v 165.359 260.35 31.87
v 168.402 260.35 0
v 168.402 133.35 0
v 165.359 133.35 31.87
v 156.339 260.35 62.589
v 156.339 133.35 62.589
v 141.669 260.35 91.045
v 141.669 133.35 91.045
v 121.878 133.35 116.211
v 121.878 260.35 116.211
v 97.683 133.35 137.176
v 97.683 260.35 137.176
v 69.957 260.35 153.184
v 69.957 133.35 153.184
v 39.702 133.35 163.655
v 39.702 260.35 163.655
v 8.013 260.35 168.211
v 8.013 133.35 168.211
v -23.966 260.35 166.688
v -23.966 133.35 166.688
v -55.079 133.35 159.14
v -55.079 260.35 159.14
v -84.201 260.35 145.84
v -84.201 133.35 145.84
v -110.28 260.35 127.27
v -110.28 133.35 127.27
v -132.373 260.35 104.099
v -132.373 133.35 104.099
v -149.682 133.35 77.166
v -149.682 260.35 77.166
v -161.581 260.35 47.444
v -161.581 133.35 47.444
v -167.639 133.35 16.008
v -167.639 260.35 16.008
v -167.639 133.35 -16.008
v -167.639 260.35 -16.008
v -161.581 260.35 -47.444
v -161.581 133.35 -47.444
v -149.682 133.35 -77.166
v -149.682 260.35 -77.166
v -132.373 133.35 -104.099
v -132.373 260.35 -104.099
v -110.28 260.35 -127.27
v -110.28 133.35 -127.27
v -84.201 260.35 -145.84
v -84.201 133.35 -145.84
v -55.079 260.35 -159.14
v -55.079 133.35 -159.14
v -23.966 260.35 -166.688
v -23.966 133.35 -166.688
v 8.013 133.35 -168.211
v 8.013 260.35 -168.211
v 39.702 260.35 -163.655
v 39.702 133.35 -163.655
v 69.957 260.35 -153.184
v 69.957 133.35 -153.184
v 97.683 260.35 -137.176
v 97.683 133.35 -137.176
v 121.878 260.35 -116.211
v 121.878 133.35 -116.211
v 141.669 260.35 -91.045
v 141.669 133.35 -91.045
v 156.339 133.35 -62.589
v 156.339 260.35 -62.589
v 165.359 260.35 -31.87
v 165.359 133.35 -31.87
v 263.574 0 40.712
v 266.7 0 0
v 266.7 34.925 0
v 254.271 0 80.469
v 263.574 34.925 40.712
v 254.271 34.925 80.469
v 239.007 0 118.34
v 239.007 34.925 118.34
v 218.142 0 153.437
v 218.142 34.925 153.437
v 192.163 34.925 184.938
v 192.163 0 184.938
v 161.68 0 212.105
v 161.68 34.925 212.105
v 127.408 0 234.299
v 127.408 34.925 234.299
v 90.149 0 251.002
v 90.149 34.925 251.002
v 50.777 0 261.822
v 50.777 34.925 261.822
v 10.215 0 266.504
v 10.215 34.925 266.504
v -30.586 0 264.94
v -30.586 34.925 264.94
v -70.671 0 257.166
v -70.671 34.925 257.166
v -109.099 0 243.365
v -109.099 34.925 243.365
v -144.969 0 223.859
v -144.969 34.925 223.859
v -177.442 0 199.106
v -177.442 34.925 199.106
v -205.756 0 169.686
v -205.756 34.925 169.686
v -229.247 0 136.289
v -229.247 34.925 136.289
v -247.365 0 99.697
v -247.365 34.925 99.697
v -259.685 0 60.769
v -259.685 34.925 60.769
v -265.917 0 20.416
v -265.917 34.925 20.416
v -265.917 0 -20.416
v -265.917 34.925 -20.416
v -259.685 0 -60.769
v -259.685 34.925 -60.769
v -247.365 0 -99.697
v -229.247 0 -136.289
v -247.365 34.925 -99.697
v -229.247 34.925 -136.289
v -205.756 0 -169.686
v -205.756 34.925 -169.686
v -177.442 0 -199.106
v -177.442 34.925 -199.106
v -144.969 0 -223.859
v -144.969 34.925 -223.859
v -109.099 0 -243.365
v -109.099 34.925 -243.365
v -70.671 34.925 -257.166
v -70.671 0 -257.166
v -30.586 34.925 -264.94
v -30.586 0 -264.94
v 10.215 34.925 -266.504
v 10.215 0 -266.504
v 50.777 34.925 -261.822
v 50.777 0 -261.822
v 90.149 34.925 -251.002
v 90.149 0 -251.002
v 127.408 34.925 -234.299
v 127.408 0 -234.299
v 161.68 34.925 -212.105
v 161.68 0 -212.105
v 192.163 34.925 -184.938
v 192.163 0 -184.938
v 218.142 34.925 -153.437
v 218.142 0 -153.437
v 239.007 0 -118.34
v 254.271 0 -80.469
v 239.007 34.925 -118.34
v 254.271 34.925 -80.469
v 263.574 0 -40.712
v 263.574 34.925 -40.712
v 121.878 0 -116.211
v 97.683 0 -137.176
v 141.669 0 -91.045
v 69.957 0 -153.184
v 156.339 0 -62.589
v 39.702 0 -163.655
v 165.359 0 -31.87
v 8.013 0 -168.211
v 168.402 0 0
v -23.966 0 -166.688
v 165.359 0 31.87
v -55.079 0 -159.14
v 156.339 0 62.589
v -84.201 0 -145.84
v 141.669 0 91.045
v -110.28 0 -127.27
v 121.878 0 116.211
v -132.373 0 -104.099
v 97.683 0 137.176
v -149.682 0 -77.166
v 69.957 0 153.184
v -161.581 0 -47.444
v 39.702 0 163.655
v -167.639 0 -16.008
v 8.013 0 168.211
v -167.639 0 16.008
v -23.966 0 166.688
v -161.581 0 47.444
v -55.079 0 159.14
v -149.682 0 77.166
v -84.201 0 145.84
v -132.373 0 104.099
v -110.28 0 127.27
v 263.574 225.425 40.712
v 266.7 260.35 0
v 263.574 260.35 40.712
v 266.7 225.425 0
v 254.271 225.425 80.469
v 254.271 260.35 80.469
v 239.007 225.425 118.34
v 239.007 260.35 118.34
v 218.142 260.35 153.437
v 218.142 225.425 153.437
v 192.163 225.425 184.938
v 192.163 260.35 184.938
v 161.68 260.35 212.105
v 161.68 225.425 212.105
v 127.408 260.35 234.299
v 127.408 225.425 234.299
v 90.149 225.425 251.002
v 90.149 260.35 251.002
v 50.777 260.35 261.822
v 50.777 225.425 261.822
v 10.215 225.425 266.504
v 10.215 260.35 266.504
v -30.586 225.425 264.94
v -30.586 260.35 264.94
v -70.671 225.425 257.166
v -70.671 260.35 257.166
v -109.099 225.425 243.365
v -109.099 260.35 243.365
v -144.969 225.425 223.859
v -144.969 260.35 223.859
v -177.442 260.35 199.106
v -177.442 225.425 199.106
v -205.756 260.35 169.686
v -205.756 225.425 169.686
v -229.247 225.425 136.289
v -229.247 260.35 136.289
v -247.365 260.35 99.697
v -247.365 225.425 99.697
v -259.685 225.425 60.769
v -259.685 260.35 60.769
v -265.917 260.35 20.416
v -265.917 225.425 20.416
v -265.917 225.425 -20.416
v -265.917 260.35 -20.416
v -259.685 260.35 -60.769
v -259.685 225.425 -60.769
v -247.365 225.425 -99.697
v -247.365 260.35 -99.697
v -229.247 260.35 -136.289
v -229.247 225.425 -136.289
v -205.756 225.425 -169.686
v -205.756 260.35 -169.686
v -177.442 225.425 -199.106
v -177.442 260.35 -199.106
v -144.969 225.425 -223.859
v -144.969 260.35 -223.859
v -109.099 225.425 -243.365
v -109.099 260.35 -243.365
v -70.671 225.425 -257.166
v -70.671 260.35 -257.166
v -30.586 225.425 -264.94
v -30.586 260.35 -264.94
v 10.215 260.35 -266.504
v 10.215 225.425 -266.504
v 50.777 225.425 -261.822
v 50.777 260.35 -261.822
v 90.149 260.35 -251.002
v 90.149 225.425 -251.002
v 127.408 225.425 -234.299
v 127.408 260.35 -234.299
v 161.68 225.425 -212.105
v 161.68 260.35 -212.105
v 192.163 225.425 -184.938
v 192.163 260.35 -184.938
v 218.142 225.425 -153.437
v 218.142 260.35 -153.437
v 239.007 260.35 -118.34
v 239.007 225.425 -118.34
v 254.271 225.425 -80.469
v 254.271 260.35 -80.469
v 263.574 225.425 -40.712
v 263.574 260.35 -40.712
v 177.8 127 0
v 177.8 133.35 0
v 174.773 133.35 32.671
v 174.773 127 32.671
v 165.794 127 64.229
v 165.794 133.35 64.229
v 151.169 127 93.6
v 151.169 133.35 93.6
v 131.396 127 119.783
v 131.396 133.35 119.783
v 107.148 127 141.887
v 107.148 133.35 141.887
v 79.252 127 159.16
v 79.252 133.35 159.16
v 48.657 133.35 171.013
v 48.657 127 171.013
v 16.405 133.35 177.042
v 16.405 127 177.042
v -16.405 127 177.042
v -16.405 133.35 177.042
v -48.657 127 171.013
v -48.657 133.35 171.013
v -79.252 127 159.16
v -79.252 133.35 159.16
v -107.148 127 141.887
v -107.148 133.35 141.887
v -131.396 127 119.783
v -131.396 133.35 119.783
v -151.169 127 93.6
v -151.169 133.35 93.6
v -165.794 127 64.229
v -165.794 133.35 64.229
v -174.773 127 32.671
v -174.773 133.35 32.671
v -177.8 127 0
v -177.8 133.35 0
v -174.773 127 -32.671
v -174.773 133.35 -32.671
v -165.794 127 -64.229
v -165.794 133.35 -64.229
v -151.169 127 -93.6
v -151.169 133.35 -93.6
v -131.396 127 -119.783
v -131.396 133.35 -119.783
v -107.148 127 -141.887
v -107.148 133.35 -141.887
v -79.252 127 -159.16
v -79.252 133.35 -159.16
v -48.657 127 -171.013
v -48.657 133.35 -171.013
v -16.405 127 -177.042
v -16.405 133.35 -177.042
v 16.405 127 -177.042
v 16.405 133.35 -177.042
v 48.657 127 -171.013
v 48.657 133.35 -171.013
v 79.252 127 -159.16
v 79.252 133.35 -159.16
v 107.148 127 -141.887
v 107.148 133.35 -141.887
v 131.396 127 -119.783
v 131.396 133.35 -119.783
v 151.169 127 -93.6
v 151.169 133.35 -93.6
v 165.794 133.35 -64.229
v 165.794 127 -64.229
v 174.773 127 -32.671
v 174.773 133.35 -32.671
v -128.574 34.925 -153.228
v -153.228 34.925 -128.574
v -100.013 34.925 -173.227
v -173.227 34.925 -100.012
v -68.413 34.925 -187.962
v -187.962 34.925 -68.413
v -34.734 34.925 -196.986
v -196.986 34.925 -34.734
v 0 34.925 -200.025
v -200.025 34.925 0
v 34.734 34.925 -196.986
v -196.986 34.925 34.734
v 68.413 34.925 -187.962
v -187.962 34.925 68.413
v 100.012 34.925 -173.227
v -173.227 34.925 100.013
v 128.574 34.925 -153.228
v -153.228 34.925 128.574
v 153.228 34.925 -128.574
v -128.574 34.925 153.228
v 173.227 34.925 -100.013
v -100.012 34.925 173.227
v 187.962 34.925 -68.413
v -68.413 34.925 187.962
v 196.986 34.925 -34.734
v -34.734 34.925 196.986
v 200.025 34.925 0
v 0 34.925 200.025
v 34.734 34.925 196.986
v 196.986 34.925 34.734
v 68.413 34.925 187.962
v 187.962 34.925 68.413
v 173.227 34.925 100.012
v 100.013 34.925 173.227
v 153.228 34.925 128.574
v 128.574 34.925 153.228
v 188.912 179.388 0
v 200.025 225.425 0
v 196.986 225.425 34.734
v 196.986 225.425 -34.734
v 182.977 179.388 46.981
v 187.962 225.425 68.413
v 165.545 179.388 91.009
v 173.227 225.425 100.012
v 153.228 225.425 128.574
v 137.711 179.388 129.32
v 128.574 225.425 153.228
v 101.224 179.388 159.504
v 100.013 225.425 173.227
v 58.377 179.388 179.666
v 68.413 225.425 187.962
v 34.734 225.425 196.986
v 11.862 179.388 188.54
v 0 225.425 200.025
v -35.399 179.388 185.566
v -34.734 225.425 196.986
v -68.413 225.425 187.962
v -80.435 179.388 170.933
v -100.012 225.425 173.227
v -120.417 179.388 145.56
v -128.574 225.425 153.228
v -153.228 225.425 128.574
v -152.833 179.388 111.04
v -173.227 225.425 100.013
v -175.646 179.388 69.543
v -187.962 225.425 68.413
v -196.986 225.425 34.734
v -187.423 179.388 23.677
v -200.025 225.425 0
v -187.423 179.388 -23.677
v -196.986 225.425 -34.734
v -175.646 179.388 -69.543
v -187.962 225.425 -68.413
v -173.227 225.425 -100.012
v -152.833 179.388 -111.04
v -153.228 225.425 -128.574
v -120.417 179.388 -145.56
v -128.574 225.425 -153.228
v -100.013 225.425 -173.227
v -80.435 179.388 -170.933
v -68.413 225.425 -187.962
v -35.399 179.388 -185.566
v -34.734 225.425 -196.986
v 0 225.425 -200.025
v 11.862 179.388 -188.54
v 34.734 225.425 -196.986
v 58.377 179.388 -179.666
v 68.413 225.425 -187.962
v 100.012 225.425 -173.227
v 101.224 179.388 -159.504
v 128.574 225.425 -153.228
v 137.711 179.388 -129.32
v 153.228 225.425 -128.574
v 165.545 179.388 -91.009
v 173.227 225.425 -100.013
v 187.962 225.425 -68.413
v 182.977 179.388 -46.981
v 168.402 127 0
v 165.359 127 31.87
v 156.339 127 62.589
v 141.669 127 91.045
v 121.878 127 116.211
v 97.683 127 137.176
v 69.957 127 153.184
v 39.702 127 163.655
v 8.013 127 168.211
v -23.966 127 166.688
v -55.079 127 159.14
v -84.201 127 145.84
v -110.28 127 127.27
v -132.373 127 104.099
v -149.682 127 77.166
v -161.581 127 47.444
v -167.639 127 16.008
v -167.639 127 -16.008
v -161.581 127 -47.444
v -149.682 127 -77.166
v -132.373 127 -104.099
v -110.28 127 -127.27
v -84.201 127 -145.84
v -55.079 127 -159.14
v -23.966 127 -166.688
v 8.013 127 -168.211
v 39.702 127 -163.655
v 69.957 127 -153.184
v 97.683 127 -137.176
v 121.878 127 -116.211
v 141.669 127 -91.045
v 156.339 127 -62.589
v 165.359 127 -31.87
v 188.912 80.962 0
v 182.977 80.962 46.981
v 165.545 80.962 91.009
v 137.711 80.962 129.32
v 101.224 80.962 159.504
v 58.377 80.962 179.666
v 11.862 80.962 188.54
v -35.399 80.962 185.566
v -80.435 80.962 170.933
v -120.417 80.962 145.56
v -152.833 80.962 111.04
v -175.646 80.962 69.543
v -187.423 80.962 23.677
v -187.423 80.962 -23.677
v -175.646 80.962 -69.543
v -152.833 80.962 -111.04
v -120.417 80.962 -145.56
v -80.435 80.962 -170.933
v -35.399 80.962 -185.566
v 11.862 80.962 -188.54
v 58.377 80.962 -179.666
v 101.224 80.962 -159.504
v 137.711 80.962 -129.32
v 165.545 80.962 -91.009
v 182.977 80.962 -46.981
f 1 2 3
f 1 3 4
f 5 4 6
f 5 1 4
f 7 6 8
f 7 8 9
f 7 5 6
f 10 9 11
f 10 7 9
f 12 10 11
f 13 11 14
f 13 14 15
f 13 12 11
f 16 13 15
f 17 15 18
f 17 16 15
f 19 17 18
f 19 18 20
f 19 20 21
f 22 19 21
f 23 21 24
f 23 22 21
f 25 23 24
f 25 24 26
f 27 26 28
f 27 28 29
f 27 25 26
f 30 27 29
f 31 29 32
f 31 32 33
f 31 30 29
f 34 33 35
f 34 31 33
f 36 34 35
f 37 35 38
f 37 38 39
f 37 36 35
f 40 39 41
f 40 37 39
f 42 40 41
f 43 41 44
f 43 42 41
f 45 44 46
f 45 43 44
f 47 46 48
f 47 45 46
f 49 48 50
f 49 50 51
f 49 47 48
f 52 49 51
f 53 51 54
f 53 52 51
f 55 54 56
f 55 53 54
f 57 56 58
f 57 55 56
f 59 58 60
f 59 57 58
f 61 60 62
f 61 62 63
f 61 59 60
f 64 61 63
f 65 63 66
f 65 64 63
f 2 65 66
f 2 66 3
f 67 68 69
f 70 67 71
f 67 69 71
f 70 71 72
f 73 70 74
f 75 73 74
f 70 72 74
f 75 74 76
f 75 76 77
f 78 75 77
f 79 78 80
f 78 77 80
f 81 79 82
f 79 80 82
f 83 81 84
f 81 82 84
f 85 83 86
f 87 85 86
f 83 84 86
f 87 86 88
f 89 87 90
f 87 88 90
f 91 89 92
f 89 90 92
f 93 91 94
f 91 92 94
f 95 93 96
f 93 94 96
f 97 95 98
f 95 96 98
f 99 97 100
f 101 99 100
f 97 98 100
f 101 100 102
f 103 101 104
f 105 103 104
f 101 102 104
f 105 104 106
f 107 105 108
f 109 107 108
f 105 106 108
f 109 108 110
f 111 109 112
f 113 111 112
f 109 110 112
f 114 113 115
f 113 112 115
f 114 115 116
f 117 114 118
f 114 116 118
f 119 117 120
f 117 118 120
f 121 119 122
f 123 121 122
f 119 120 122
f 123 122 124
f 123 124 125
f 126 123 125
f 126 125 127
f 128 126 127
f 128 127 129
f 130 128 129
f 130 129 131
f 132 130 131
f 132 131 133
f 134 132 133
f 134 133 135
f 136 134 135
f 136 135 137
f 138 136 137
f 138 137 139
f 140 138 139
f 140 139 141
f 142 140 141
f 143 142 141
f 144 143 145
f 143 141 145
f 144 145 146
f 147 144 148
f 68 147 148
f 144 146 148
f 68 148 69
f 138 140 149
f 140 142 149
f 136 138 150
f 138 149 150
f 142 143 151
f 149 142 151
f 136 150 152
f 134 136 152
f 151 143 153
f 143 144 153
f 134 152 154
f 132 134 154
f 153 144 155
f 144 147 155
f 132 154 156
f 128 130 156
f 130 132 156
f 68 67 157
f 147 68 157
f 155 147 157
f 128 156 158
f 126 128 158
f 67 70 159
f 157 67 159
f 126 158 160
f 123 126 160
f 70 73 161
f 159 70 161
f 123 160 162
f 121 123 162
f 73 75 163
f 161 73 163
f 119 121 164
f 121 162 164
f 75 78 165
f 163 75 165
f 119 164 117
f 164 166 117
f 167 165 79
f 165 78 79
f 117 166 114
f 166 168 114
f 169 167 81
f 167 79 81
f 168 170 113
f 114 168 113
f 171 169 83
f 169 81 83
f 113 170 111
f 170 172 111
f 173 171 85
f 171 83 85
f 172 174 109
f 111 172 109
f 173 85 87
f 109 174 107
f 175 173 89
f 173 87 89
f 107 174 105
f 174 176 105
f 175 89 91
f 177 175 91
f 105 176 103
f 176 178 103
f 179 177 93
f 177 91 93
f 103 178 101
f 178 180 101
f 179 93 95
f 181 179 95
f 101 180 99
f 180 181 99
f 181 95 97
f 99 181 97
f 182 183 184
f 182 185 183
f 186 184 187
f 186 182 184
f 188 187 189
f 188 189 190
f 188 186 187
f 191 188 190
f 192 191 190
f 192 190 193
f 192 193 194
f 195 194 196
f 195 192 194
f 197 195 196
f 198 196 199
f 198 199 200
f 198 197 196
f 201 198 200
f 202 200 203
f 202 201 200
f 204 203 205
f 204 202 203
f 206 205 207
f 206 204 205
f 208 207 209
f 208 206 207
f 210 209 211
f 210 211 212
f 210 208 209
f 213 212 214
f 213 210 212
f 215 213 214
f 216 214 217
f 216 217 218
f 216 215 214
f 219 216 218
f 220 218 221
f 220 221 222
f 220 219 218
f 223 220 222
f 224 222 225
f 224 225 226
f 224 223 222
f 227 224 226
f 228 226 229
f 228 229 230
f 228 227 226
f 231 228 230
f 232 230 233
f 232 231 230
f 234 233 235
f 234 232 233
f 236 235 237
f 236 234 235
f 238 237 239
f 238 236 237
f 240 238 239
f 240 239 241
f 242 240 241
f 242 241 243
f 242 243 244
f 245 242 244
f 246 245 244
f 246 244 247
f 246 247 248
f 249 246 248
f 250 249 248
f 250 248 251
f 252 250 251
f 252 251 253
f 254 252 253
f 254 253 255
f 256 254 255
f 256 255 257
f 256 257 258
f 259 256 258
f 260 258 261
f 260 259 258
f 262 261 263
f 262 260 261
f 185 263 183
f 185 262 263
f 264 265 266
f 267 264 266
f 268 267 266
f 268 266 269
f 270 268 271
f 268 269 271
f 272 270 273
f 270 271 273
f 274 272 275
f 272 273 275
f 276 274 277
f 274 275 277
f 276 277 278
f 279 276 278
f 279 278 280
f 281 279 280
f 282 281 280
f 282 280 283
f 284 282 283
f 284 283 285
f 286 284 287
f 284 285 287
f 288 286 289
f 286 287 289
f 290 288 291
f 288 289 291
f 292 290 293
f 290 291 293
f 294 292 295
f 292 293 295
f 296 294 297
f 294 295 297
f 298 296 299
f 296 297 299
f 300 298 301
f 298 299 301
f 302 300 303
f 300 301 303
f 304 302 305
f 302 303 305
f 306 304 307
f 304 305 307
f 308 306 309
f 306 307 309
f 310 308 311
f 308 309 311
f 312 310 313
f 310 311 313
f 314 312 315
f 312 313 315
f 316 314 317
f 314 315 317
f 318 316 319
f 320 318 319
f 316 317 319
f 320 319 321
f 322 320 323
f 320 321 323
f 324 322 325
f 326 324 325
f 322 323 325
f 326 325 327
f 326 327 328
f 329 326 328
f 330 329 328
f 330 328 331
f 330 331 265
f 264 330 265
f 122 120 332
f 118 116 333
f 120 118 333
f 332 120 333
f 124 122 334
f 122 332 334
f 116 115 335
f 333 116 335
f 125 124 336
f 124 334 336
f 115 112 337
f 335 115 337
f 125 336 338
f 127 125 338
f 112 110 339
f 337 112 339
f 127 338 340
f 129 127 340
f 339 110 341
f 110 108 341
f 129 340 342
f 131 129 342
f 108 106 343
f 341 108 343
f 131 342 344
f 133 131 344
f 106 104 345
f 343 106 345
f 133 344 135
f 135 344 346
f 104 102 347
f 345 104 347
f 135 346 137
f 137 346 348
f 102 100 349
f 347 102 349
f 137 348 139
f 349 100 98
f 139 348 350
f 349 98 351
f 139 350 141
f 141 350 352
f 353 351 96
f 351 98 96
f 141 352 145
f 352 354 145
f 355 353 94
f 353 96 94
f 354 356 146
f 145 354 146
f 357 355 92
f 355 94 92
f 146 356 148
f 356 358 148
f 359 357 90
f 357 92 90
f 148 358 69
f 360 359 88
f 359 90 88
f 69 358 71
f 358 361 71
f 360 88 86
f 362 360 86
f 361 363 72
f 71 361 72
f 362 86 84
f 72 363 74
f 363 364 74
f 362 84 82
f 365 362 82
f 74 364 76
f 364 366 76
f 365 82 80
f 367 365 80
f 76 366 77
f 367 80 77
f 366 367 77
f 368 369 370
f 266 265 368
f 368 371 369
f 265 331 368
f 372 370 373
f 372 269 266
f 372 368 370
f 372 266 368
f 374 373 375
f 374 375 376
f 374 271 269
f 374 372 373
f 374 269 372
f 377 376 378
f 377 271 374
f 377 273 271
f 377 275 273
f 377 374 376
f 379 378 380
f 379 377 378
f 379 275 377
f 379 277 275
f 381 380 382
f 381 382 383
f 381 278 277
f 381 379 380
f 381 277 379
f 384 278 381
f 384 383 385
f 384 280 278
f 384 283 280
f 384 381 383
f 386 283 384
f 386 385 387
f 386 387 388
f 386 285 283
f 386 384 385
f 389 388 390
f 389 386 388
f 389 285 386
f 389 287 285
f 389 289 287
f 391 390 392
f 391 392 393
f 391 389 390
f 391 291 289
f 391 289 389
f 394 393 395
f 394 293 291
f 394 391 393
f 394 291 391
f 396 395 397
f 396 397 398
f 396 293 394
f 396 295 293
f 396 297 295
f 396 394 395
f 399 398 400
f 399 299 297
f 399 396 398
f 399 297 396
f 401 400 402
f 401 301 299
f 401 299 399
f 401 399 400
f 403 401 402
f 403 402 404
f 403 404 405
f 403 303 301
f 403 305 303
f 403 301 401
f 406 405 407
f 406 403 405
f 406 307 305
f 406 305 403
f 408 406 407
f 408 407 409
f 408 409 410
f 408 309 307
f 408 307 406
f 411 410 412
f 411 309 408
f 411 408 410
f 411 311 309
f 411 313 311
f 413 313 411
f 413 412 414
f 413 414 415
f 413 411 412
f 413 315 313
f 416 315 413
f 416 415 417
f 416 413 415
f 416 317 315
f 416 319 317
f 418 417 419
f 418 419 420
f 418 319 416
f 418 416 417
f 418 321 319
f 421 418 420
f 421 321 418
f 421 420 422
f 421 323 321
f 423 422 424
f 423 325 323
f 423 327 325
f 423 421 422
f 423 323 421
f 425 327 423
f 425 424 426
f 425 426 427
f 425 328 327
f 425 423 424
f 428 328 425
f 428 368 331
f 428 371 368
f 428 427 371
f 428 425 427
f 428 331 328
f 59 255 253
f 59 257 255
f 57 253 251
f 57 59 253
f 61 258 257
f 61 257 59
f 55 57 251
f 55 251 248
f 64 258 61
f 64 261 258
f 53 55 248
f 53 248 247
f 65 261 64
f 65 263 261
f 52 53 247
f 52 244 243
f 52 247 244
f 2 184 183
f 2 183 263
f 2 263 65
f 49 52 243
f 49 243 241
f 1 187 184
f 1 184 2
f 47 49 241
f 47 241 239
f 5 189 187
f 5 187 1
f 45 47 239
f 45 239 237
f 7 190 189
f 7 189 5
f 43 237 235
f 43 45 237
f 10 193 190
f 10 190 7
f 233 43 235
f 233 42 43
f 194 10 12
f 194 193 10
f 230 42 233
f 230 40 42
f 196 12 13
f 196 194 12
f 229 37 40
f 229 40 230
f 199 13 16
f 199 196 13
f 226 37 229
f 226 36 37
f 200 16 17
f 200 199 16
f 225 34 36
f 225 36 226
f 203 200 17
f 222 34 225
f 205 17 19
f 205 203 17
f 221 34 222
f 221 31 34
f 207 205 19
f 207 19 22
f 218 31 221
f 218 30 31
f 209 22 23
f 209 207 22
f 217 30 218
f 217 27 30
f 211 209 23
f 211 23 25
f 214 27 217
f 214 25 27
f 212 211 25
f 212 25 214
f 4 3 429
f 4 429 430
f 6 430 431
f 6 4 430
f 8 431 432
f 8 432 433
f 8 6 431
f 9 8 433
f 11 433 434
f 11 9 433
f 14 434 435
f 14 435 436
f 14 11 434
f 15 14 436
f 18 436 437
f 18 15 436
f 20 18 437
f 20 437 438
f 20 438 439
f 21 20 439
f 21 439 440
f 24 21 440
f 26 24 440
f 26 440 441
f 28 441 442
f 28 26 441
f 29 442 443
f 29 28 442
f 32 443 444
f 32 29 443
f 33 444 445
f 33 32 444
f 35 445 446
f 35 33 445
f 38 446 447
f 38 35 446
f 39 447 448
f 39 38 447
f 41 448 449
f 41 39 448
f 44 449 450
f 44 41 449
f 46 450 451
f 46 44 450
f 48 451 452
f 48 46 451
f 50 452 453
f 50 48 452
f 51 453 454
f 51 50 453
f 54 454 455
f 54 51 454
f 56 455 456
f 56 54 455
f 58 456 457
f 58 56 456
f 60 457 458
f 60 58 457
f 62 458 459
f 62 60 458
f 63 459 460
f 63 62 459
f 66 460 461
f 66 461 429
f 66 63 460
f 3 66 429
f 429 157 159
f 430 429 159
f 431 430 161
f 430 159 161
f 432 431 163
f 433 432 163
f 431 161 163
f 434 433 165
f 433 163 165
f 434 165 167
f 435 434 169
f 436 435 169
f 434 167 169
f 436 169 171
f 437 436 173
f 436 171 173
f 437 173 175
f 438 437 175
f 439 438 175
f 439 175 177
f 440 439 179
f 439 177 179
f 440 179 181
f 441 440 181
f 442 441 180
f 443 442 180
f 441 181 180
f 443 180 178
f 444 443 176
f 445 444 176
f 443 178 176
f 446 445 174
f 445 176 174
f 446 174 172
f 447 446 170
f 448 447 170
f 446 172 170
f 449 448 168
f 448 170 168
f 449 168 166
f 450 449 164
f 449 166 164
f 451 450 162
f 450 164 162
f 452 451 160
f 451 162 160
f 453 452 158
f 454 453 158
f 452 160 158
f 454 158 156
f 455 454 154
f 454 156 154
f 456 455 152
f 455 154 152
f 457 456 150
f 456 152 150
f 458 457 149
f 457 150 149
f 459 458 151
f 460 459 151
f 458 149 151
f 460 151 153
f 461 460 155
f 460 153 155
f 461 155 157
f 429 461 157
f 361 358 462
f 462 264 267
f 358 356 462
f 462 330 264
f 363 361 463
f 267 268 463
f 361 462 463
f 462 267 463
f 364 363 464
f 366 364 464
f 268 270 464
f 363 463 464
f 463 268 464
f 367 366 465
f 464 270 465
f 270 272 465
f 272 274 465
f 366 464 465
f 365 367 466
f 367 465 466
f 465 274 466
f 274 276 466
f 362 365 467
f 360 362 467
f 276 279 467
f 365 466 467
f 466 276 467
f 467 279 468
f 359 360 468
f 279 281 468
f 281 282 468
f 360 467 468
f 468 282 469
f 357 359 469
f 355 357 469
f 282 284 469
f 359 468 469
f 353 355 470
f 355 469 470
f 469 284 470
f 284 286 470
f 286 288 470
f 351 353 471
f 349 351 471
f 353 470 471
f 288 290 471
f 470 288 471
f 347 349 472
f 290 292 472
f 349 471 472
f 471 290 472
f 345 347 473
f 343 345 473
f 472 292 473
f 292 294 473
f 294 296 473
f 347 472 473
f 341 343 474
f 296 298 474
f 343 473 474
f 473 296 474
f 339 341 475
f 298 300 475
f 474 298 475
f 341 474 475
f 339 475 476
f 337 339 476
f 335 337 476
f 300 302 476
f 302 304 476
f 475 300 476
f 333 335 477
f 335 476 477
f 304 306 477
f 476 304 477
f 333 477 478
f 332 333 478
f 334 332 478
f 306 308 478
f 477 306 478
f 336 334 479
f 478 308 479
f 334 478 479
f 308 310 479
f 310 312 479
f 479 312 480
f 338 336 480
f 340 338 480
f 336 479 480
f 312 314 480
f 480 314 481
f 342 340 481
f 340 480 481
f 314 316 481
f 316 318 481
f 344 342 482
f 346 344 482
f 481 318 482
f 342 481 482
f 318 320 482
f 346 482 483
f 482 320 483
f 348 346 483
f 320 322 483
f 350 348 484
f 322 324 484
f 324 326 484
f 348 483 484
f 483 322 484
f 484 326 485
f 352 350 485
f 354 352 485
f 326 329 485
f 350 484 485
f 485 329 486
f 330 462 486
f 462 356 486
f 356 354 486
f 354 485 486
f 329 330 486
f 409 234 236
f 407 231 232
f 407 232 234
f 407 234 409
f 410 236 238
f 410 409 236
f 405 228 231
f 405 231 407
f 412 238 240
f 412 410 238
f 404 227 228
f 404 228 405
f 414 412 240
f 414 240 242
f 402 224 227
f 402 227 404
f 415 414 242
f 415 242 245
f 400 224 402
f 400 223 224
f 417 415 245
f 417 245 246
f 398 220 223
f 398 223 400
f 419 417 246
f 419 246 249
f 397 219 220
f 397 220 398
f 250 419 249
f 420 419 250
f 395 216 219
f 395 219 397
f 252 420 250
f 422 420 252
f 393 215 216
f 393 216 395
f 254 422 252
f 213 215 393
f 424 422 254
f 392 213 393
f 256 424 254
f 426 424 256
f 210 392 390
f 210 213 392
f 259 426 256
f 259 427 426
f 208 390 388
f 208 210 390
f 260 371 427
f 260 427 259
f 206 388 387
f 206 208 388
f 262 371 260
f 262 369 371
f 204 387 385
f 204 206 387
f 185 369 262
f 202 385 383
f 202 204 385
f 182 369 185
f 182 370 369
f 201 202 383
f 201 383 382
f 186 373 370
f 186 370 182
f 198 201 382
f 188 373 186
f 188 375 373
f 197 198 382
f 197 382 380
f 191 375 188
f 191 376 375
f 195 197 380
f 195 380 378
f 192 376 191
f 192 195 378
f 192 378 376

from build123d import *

# Parameters (mm, degrees)
F4_W = 9.398
F4_H = 6.35


with BuildPart() as f1:
    # F0 (on Top) → F1 (revolve)
    with BuildSketch(Plane.XY):
        Polygon((168.402, 0), (266.7, 0), (266.7, 34.925), (200.025, 34.925), (177.8, 127), (168.402, 127), align=None)
    revolve(axis=Axis((0, 63.5, 0), (0, -1, 0)))



with BuildPart() as f3_1:
    # F3: instance of F1
    add(f1.part.mirror(Plane.XZ.offset(-130.175)))


with BuildPart() as f1_1:
    add(f1.part)

    add(f3_1.part)  # F5 merges F3_1
    # F4 (on Top) → F5 (revolve)
    with BuildSketch(Plane.XY):
        with Locations((173.101, 130.175)):
            Rectangle(F4_W, F4_H)
    revolve(axis=Axis((0, 63.5, 0), (0, -1, 0)))


solid = f1_1.part
